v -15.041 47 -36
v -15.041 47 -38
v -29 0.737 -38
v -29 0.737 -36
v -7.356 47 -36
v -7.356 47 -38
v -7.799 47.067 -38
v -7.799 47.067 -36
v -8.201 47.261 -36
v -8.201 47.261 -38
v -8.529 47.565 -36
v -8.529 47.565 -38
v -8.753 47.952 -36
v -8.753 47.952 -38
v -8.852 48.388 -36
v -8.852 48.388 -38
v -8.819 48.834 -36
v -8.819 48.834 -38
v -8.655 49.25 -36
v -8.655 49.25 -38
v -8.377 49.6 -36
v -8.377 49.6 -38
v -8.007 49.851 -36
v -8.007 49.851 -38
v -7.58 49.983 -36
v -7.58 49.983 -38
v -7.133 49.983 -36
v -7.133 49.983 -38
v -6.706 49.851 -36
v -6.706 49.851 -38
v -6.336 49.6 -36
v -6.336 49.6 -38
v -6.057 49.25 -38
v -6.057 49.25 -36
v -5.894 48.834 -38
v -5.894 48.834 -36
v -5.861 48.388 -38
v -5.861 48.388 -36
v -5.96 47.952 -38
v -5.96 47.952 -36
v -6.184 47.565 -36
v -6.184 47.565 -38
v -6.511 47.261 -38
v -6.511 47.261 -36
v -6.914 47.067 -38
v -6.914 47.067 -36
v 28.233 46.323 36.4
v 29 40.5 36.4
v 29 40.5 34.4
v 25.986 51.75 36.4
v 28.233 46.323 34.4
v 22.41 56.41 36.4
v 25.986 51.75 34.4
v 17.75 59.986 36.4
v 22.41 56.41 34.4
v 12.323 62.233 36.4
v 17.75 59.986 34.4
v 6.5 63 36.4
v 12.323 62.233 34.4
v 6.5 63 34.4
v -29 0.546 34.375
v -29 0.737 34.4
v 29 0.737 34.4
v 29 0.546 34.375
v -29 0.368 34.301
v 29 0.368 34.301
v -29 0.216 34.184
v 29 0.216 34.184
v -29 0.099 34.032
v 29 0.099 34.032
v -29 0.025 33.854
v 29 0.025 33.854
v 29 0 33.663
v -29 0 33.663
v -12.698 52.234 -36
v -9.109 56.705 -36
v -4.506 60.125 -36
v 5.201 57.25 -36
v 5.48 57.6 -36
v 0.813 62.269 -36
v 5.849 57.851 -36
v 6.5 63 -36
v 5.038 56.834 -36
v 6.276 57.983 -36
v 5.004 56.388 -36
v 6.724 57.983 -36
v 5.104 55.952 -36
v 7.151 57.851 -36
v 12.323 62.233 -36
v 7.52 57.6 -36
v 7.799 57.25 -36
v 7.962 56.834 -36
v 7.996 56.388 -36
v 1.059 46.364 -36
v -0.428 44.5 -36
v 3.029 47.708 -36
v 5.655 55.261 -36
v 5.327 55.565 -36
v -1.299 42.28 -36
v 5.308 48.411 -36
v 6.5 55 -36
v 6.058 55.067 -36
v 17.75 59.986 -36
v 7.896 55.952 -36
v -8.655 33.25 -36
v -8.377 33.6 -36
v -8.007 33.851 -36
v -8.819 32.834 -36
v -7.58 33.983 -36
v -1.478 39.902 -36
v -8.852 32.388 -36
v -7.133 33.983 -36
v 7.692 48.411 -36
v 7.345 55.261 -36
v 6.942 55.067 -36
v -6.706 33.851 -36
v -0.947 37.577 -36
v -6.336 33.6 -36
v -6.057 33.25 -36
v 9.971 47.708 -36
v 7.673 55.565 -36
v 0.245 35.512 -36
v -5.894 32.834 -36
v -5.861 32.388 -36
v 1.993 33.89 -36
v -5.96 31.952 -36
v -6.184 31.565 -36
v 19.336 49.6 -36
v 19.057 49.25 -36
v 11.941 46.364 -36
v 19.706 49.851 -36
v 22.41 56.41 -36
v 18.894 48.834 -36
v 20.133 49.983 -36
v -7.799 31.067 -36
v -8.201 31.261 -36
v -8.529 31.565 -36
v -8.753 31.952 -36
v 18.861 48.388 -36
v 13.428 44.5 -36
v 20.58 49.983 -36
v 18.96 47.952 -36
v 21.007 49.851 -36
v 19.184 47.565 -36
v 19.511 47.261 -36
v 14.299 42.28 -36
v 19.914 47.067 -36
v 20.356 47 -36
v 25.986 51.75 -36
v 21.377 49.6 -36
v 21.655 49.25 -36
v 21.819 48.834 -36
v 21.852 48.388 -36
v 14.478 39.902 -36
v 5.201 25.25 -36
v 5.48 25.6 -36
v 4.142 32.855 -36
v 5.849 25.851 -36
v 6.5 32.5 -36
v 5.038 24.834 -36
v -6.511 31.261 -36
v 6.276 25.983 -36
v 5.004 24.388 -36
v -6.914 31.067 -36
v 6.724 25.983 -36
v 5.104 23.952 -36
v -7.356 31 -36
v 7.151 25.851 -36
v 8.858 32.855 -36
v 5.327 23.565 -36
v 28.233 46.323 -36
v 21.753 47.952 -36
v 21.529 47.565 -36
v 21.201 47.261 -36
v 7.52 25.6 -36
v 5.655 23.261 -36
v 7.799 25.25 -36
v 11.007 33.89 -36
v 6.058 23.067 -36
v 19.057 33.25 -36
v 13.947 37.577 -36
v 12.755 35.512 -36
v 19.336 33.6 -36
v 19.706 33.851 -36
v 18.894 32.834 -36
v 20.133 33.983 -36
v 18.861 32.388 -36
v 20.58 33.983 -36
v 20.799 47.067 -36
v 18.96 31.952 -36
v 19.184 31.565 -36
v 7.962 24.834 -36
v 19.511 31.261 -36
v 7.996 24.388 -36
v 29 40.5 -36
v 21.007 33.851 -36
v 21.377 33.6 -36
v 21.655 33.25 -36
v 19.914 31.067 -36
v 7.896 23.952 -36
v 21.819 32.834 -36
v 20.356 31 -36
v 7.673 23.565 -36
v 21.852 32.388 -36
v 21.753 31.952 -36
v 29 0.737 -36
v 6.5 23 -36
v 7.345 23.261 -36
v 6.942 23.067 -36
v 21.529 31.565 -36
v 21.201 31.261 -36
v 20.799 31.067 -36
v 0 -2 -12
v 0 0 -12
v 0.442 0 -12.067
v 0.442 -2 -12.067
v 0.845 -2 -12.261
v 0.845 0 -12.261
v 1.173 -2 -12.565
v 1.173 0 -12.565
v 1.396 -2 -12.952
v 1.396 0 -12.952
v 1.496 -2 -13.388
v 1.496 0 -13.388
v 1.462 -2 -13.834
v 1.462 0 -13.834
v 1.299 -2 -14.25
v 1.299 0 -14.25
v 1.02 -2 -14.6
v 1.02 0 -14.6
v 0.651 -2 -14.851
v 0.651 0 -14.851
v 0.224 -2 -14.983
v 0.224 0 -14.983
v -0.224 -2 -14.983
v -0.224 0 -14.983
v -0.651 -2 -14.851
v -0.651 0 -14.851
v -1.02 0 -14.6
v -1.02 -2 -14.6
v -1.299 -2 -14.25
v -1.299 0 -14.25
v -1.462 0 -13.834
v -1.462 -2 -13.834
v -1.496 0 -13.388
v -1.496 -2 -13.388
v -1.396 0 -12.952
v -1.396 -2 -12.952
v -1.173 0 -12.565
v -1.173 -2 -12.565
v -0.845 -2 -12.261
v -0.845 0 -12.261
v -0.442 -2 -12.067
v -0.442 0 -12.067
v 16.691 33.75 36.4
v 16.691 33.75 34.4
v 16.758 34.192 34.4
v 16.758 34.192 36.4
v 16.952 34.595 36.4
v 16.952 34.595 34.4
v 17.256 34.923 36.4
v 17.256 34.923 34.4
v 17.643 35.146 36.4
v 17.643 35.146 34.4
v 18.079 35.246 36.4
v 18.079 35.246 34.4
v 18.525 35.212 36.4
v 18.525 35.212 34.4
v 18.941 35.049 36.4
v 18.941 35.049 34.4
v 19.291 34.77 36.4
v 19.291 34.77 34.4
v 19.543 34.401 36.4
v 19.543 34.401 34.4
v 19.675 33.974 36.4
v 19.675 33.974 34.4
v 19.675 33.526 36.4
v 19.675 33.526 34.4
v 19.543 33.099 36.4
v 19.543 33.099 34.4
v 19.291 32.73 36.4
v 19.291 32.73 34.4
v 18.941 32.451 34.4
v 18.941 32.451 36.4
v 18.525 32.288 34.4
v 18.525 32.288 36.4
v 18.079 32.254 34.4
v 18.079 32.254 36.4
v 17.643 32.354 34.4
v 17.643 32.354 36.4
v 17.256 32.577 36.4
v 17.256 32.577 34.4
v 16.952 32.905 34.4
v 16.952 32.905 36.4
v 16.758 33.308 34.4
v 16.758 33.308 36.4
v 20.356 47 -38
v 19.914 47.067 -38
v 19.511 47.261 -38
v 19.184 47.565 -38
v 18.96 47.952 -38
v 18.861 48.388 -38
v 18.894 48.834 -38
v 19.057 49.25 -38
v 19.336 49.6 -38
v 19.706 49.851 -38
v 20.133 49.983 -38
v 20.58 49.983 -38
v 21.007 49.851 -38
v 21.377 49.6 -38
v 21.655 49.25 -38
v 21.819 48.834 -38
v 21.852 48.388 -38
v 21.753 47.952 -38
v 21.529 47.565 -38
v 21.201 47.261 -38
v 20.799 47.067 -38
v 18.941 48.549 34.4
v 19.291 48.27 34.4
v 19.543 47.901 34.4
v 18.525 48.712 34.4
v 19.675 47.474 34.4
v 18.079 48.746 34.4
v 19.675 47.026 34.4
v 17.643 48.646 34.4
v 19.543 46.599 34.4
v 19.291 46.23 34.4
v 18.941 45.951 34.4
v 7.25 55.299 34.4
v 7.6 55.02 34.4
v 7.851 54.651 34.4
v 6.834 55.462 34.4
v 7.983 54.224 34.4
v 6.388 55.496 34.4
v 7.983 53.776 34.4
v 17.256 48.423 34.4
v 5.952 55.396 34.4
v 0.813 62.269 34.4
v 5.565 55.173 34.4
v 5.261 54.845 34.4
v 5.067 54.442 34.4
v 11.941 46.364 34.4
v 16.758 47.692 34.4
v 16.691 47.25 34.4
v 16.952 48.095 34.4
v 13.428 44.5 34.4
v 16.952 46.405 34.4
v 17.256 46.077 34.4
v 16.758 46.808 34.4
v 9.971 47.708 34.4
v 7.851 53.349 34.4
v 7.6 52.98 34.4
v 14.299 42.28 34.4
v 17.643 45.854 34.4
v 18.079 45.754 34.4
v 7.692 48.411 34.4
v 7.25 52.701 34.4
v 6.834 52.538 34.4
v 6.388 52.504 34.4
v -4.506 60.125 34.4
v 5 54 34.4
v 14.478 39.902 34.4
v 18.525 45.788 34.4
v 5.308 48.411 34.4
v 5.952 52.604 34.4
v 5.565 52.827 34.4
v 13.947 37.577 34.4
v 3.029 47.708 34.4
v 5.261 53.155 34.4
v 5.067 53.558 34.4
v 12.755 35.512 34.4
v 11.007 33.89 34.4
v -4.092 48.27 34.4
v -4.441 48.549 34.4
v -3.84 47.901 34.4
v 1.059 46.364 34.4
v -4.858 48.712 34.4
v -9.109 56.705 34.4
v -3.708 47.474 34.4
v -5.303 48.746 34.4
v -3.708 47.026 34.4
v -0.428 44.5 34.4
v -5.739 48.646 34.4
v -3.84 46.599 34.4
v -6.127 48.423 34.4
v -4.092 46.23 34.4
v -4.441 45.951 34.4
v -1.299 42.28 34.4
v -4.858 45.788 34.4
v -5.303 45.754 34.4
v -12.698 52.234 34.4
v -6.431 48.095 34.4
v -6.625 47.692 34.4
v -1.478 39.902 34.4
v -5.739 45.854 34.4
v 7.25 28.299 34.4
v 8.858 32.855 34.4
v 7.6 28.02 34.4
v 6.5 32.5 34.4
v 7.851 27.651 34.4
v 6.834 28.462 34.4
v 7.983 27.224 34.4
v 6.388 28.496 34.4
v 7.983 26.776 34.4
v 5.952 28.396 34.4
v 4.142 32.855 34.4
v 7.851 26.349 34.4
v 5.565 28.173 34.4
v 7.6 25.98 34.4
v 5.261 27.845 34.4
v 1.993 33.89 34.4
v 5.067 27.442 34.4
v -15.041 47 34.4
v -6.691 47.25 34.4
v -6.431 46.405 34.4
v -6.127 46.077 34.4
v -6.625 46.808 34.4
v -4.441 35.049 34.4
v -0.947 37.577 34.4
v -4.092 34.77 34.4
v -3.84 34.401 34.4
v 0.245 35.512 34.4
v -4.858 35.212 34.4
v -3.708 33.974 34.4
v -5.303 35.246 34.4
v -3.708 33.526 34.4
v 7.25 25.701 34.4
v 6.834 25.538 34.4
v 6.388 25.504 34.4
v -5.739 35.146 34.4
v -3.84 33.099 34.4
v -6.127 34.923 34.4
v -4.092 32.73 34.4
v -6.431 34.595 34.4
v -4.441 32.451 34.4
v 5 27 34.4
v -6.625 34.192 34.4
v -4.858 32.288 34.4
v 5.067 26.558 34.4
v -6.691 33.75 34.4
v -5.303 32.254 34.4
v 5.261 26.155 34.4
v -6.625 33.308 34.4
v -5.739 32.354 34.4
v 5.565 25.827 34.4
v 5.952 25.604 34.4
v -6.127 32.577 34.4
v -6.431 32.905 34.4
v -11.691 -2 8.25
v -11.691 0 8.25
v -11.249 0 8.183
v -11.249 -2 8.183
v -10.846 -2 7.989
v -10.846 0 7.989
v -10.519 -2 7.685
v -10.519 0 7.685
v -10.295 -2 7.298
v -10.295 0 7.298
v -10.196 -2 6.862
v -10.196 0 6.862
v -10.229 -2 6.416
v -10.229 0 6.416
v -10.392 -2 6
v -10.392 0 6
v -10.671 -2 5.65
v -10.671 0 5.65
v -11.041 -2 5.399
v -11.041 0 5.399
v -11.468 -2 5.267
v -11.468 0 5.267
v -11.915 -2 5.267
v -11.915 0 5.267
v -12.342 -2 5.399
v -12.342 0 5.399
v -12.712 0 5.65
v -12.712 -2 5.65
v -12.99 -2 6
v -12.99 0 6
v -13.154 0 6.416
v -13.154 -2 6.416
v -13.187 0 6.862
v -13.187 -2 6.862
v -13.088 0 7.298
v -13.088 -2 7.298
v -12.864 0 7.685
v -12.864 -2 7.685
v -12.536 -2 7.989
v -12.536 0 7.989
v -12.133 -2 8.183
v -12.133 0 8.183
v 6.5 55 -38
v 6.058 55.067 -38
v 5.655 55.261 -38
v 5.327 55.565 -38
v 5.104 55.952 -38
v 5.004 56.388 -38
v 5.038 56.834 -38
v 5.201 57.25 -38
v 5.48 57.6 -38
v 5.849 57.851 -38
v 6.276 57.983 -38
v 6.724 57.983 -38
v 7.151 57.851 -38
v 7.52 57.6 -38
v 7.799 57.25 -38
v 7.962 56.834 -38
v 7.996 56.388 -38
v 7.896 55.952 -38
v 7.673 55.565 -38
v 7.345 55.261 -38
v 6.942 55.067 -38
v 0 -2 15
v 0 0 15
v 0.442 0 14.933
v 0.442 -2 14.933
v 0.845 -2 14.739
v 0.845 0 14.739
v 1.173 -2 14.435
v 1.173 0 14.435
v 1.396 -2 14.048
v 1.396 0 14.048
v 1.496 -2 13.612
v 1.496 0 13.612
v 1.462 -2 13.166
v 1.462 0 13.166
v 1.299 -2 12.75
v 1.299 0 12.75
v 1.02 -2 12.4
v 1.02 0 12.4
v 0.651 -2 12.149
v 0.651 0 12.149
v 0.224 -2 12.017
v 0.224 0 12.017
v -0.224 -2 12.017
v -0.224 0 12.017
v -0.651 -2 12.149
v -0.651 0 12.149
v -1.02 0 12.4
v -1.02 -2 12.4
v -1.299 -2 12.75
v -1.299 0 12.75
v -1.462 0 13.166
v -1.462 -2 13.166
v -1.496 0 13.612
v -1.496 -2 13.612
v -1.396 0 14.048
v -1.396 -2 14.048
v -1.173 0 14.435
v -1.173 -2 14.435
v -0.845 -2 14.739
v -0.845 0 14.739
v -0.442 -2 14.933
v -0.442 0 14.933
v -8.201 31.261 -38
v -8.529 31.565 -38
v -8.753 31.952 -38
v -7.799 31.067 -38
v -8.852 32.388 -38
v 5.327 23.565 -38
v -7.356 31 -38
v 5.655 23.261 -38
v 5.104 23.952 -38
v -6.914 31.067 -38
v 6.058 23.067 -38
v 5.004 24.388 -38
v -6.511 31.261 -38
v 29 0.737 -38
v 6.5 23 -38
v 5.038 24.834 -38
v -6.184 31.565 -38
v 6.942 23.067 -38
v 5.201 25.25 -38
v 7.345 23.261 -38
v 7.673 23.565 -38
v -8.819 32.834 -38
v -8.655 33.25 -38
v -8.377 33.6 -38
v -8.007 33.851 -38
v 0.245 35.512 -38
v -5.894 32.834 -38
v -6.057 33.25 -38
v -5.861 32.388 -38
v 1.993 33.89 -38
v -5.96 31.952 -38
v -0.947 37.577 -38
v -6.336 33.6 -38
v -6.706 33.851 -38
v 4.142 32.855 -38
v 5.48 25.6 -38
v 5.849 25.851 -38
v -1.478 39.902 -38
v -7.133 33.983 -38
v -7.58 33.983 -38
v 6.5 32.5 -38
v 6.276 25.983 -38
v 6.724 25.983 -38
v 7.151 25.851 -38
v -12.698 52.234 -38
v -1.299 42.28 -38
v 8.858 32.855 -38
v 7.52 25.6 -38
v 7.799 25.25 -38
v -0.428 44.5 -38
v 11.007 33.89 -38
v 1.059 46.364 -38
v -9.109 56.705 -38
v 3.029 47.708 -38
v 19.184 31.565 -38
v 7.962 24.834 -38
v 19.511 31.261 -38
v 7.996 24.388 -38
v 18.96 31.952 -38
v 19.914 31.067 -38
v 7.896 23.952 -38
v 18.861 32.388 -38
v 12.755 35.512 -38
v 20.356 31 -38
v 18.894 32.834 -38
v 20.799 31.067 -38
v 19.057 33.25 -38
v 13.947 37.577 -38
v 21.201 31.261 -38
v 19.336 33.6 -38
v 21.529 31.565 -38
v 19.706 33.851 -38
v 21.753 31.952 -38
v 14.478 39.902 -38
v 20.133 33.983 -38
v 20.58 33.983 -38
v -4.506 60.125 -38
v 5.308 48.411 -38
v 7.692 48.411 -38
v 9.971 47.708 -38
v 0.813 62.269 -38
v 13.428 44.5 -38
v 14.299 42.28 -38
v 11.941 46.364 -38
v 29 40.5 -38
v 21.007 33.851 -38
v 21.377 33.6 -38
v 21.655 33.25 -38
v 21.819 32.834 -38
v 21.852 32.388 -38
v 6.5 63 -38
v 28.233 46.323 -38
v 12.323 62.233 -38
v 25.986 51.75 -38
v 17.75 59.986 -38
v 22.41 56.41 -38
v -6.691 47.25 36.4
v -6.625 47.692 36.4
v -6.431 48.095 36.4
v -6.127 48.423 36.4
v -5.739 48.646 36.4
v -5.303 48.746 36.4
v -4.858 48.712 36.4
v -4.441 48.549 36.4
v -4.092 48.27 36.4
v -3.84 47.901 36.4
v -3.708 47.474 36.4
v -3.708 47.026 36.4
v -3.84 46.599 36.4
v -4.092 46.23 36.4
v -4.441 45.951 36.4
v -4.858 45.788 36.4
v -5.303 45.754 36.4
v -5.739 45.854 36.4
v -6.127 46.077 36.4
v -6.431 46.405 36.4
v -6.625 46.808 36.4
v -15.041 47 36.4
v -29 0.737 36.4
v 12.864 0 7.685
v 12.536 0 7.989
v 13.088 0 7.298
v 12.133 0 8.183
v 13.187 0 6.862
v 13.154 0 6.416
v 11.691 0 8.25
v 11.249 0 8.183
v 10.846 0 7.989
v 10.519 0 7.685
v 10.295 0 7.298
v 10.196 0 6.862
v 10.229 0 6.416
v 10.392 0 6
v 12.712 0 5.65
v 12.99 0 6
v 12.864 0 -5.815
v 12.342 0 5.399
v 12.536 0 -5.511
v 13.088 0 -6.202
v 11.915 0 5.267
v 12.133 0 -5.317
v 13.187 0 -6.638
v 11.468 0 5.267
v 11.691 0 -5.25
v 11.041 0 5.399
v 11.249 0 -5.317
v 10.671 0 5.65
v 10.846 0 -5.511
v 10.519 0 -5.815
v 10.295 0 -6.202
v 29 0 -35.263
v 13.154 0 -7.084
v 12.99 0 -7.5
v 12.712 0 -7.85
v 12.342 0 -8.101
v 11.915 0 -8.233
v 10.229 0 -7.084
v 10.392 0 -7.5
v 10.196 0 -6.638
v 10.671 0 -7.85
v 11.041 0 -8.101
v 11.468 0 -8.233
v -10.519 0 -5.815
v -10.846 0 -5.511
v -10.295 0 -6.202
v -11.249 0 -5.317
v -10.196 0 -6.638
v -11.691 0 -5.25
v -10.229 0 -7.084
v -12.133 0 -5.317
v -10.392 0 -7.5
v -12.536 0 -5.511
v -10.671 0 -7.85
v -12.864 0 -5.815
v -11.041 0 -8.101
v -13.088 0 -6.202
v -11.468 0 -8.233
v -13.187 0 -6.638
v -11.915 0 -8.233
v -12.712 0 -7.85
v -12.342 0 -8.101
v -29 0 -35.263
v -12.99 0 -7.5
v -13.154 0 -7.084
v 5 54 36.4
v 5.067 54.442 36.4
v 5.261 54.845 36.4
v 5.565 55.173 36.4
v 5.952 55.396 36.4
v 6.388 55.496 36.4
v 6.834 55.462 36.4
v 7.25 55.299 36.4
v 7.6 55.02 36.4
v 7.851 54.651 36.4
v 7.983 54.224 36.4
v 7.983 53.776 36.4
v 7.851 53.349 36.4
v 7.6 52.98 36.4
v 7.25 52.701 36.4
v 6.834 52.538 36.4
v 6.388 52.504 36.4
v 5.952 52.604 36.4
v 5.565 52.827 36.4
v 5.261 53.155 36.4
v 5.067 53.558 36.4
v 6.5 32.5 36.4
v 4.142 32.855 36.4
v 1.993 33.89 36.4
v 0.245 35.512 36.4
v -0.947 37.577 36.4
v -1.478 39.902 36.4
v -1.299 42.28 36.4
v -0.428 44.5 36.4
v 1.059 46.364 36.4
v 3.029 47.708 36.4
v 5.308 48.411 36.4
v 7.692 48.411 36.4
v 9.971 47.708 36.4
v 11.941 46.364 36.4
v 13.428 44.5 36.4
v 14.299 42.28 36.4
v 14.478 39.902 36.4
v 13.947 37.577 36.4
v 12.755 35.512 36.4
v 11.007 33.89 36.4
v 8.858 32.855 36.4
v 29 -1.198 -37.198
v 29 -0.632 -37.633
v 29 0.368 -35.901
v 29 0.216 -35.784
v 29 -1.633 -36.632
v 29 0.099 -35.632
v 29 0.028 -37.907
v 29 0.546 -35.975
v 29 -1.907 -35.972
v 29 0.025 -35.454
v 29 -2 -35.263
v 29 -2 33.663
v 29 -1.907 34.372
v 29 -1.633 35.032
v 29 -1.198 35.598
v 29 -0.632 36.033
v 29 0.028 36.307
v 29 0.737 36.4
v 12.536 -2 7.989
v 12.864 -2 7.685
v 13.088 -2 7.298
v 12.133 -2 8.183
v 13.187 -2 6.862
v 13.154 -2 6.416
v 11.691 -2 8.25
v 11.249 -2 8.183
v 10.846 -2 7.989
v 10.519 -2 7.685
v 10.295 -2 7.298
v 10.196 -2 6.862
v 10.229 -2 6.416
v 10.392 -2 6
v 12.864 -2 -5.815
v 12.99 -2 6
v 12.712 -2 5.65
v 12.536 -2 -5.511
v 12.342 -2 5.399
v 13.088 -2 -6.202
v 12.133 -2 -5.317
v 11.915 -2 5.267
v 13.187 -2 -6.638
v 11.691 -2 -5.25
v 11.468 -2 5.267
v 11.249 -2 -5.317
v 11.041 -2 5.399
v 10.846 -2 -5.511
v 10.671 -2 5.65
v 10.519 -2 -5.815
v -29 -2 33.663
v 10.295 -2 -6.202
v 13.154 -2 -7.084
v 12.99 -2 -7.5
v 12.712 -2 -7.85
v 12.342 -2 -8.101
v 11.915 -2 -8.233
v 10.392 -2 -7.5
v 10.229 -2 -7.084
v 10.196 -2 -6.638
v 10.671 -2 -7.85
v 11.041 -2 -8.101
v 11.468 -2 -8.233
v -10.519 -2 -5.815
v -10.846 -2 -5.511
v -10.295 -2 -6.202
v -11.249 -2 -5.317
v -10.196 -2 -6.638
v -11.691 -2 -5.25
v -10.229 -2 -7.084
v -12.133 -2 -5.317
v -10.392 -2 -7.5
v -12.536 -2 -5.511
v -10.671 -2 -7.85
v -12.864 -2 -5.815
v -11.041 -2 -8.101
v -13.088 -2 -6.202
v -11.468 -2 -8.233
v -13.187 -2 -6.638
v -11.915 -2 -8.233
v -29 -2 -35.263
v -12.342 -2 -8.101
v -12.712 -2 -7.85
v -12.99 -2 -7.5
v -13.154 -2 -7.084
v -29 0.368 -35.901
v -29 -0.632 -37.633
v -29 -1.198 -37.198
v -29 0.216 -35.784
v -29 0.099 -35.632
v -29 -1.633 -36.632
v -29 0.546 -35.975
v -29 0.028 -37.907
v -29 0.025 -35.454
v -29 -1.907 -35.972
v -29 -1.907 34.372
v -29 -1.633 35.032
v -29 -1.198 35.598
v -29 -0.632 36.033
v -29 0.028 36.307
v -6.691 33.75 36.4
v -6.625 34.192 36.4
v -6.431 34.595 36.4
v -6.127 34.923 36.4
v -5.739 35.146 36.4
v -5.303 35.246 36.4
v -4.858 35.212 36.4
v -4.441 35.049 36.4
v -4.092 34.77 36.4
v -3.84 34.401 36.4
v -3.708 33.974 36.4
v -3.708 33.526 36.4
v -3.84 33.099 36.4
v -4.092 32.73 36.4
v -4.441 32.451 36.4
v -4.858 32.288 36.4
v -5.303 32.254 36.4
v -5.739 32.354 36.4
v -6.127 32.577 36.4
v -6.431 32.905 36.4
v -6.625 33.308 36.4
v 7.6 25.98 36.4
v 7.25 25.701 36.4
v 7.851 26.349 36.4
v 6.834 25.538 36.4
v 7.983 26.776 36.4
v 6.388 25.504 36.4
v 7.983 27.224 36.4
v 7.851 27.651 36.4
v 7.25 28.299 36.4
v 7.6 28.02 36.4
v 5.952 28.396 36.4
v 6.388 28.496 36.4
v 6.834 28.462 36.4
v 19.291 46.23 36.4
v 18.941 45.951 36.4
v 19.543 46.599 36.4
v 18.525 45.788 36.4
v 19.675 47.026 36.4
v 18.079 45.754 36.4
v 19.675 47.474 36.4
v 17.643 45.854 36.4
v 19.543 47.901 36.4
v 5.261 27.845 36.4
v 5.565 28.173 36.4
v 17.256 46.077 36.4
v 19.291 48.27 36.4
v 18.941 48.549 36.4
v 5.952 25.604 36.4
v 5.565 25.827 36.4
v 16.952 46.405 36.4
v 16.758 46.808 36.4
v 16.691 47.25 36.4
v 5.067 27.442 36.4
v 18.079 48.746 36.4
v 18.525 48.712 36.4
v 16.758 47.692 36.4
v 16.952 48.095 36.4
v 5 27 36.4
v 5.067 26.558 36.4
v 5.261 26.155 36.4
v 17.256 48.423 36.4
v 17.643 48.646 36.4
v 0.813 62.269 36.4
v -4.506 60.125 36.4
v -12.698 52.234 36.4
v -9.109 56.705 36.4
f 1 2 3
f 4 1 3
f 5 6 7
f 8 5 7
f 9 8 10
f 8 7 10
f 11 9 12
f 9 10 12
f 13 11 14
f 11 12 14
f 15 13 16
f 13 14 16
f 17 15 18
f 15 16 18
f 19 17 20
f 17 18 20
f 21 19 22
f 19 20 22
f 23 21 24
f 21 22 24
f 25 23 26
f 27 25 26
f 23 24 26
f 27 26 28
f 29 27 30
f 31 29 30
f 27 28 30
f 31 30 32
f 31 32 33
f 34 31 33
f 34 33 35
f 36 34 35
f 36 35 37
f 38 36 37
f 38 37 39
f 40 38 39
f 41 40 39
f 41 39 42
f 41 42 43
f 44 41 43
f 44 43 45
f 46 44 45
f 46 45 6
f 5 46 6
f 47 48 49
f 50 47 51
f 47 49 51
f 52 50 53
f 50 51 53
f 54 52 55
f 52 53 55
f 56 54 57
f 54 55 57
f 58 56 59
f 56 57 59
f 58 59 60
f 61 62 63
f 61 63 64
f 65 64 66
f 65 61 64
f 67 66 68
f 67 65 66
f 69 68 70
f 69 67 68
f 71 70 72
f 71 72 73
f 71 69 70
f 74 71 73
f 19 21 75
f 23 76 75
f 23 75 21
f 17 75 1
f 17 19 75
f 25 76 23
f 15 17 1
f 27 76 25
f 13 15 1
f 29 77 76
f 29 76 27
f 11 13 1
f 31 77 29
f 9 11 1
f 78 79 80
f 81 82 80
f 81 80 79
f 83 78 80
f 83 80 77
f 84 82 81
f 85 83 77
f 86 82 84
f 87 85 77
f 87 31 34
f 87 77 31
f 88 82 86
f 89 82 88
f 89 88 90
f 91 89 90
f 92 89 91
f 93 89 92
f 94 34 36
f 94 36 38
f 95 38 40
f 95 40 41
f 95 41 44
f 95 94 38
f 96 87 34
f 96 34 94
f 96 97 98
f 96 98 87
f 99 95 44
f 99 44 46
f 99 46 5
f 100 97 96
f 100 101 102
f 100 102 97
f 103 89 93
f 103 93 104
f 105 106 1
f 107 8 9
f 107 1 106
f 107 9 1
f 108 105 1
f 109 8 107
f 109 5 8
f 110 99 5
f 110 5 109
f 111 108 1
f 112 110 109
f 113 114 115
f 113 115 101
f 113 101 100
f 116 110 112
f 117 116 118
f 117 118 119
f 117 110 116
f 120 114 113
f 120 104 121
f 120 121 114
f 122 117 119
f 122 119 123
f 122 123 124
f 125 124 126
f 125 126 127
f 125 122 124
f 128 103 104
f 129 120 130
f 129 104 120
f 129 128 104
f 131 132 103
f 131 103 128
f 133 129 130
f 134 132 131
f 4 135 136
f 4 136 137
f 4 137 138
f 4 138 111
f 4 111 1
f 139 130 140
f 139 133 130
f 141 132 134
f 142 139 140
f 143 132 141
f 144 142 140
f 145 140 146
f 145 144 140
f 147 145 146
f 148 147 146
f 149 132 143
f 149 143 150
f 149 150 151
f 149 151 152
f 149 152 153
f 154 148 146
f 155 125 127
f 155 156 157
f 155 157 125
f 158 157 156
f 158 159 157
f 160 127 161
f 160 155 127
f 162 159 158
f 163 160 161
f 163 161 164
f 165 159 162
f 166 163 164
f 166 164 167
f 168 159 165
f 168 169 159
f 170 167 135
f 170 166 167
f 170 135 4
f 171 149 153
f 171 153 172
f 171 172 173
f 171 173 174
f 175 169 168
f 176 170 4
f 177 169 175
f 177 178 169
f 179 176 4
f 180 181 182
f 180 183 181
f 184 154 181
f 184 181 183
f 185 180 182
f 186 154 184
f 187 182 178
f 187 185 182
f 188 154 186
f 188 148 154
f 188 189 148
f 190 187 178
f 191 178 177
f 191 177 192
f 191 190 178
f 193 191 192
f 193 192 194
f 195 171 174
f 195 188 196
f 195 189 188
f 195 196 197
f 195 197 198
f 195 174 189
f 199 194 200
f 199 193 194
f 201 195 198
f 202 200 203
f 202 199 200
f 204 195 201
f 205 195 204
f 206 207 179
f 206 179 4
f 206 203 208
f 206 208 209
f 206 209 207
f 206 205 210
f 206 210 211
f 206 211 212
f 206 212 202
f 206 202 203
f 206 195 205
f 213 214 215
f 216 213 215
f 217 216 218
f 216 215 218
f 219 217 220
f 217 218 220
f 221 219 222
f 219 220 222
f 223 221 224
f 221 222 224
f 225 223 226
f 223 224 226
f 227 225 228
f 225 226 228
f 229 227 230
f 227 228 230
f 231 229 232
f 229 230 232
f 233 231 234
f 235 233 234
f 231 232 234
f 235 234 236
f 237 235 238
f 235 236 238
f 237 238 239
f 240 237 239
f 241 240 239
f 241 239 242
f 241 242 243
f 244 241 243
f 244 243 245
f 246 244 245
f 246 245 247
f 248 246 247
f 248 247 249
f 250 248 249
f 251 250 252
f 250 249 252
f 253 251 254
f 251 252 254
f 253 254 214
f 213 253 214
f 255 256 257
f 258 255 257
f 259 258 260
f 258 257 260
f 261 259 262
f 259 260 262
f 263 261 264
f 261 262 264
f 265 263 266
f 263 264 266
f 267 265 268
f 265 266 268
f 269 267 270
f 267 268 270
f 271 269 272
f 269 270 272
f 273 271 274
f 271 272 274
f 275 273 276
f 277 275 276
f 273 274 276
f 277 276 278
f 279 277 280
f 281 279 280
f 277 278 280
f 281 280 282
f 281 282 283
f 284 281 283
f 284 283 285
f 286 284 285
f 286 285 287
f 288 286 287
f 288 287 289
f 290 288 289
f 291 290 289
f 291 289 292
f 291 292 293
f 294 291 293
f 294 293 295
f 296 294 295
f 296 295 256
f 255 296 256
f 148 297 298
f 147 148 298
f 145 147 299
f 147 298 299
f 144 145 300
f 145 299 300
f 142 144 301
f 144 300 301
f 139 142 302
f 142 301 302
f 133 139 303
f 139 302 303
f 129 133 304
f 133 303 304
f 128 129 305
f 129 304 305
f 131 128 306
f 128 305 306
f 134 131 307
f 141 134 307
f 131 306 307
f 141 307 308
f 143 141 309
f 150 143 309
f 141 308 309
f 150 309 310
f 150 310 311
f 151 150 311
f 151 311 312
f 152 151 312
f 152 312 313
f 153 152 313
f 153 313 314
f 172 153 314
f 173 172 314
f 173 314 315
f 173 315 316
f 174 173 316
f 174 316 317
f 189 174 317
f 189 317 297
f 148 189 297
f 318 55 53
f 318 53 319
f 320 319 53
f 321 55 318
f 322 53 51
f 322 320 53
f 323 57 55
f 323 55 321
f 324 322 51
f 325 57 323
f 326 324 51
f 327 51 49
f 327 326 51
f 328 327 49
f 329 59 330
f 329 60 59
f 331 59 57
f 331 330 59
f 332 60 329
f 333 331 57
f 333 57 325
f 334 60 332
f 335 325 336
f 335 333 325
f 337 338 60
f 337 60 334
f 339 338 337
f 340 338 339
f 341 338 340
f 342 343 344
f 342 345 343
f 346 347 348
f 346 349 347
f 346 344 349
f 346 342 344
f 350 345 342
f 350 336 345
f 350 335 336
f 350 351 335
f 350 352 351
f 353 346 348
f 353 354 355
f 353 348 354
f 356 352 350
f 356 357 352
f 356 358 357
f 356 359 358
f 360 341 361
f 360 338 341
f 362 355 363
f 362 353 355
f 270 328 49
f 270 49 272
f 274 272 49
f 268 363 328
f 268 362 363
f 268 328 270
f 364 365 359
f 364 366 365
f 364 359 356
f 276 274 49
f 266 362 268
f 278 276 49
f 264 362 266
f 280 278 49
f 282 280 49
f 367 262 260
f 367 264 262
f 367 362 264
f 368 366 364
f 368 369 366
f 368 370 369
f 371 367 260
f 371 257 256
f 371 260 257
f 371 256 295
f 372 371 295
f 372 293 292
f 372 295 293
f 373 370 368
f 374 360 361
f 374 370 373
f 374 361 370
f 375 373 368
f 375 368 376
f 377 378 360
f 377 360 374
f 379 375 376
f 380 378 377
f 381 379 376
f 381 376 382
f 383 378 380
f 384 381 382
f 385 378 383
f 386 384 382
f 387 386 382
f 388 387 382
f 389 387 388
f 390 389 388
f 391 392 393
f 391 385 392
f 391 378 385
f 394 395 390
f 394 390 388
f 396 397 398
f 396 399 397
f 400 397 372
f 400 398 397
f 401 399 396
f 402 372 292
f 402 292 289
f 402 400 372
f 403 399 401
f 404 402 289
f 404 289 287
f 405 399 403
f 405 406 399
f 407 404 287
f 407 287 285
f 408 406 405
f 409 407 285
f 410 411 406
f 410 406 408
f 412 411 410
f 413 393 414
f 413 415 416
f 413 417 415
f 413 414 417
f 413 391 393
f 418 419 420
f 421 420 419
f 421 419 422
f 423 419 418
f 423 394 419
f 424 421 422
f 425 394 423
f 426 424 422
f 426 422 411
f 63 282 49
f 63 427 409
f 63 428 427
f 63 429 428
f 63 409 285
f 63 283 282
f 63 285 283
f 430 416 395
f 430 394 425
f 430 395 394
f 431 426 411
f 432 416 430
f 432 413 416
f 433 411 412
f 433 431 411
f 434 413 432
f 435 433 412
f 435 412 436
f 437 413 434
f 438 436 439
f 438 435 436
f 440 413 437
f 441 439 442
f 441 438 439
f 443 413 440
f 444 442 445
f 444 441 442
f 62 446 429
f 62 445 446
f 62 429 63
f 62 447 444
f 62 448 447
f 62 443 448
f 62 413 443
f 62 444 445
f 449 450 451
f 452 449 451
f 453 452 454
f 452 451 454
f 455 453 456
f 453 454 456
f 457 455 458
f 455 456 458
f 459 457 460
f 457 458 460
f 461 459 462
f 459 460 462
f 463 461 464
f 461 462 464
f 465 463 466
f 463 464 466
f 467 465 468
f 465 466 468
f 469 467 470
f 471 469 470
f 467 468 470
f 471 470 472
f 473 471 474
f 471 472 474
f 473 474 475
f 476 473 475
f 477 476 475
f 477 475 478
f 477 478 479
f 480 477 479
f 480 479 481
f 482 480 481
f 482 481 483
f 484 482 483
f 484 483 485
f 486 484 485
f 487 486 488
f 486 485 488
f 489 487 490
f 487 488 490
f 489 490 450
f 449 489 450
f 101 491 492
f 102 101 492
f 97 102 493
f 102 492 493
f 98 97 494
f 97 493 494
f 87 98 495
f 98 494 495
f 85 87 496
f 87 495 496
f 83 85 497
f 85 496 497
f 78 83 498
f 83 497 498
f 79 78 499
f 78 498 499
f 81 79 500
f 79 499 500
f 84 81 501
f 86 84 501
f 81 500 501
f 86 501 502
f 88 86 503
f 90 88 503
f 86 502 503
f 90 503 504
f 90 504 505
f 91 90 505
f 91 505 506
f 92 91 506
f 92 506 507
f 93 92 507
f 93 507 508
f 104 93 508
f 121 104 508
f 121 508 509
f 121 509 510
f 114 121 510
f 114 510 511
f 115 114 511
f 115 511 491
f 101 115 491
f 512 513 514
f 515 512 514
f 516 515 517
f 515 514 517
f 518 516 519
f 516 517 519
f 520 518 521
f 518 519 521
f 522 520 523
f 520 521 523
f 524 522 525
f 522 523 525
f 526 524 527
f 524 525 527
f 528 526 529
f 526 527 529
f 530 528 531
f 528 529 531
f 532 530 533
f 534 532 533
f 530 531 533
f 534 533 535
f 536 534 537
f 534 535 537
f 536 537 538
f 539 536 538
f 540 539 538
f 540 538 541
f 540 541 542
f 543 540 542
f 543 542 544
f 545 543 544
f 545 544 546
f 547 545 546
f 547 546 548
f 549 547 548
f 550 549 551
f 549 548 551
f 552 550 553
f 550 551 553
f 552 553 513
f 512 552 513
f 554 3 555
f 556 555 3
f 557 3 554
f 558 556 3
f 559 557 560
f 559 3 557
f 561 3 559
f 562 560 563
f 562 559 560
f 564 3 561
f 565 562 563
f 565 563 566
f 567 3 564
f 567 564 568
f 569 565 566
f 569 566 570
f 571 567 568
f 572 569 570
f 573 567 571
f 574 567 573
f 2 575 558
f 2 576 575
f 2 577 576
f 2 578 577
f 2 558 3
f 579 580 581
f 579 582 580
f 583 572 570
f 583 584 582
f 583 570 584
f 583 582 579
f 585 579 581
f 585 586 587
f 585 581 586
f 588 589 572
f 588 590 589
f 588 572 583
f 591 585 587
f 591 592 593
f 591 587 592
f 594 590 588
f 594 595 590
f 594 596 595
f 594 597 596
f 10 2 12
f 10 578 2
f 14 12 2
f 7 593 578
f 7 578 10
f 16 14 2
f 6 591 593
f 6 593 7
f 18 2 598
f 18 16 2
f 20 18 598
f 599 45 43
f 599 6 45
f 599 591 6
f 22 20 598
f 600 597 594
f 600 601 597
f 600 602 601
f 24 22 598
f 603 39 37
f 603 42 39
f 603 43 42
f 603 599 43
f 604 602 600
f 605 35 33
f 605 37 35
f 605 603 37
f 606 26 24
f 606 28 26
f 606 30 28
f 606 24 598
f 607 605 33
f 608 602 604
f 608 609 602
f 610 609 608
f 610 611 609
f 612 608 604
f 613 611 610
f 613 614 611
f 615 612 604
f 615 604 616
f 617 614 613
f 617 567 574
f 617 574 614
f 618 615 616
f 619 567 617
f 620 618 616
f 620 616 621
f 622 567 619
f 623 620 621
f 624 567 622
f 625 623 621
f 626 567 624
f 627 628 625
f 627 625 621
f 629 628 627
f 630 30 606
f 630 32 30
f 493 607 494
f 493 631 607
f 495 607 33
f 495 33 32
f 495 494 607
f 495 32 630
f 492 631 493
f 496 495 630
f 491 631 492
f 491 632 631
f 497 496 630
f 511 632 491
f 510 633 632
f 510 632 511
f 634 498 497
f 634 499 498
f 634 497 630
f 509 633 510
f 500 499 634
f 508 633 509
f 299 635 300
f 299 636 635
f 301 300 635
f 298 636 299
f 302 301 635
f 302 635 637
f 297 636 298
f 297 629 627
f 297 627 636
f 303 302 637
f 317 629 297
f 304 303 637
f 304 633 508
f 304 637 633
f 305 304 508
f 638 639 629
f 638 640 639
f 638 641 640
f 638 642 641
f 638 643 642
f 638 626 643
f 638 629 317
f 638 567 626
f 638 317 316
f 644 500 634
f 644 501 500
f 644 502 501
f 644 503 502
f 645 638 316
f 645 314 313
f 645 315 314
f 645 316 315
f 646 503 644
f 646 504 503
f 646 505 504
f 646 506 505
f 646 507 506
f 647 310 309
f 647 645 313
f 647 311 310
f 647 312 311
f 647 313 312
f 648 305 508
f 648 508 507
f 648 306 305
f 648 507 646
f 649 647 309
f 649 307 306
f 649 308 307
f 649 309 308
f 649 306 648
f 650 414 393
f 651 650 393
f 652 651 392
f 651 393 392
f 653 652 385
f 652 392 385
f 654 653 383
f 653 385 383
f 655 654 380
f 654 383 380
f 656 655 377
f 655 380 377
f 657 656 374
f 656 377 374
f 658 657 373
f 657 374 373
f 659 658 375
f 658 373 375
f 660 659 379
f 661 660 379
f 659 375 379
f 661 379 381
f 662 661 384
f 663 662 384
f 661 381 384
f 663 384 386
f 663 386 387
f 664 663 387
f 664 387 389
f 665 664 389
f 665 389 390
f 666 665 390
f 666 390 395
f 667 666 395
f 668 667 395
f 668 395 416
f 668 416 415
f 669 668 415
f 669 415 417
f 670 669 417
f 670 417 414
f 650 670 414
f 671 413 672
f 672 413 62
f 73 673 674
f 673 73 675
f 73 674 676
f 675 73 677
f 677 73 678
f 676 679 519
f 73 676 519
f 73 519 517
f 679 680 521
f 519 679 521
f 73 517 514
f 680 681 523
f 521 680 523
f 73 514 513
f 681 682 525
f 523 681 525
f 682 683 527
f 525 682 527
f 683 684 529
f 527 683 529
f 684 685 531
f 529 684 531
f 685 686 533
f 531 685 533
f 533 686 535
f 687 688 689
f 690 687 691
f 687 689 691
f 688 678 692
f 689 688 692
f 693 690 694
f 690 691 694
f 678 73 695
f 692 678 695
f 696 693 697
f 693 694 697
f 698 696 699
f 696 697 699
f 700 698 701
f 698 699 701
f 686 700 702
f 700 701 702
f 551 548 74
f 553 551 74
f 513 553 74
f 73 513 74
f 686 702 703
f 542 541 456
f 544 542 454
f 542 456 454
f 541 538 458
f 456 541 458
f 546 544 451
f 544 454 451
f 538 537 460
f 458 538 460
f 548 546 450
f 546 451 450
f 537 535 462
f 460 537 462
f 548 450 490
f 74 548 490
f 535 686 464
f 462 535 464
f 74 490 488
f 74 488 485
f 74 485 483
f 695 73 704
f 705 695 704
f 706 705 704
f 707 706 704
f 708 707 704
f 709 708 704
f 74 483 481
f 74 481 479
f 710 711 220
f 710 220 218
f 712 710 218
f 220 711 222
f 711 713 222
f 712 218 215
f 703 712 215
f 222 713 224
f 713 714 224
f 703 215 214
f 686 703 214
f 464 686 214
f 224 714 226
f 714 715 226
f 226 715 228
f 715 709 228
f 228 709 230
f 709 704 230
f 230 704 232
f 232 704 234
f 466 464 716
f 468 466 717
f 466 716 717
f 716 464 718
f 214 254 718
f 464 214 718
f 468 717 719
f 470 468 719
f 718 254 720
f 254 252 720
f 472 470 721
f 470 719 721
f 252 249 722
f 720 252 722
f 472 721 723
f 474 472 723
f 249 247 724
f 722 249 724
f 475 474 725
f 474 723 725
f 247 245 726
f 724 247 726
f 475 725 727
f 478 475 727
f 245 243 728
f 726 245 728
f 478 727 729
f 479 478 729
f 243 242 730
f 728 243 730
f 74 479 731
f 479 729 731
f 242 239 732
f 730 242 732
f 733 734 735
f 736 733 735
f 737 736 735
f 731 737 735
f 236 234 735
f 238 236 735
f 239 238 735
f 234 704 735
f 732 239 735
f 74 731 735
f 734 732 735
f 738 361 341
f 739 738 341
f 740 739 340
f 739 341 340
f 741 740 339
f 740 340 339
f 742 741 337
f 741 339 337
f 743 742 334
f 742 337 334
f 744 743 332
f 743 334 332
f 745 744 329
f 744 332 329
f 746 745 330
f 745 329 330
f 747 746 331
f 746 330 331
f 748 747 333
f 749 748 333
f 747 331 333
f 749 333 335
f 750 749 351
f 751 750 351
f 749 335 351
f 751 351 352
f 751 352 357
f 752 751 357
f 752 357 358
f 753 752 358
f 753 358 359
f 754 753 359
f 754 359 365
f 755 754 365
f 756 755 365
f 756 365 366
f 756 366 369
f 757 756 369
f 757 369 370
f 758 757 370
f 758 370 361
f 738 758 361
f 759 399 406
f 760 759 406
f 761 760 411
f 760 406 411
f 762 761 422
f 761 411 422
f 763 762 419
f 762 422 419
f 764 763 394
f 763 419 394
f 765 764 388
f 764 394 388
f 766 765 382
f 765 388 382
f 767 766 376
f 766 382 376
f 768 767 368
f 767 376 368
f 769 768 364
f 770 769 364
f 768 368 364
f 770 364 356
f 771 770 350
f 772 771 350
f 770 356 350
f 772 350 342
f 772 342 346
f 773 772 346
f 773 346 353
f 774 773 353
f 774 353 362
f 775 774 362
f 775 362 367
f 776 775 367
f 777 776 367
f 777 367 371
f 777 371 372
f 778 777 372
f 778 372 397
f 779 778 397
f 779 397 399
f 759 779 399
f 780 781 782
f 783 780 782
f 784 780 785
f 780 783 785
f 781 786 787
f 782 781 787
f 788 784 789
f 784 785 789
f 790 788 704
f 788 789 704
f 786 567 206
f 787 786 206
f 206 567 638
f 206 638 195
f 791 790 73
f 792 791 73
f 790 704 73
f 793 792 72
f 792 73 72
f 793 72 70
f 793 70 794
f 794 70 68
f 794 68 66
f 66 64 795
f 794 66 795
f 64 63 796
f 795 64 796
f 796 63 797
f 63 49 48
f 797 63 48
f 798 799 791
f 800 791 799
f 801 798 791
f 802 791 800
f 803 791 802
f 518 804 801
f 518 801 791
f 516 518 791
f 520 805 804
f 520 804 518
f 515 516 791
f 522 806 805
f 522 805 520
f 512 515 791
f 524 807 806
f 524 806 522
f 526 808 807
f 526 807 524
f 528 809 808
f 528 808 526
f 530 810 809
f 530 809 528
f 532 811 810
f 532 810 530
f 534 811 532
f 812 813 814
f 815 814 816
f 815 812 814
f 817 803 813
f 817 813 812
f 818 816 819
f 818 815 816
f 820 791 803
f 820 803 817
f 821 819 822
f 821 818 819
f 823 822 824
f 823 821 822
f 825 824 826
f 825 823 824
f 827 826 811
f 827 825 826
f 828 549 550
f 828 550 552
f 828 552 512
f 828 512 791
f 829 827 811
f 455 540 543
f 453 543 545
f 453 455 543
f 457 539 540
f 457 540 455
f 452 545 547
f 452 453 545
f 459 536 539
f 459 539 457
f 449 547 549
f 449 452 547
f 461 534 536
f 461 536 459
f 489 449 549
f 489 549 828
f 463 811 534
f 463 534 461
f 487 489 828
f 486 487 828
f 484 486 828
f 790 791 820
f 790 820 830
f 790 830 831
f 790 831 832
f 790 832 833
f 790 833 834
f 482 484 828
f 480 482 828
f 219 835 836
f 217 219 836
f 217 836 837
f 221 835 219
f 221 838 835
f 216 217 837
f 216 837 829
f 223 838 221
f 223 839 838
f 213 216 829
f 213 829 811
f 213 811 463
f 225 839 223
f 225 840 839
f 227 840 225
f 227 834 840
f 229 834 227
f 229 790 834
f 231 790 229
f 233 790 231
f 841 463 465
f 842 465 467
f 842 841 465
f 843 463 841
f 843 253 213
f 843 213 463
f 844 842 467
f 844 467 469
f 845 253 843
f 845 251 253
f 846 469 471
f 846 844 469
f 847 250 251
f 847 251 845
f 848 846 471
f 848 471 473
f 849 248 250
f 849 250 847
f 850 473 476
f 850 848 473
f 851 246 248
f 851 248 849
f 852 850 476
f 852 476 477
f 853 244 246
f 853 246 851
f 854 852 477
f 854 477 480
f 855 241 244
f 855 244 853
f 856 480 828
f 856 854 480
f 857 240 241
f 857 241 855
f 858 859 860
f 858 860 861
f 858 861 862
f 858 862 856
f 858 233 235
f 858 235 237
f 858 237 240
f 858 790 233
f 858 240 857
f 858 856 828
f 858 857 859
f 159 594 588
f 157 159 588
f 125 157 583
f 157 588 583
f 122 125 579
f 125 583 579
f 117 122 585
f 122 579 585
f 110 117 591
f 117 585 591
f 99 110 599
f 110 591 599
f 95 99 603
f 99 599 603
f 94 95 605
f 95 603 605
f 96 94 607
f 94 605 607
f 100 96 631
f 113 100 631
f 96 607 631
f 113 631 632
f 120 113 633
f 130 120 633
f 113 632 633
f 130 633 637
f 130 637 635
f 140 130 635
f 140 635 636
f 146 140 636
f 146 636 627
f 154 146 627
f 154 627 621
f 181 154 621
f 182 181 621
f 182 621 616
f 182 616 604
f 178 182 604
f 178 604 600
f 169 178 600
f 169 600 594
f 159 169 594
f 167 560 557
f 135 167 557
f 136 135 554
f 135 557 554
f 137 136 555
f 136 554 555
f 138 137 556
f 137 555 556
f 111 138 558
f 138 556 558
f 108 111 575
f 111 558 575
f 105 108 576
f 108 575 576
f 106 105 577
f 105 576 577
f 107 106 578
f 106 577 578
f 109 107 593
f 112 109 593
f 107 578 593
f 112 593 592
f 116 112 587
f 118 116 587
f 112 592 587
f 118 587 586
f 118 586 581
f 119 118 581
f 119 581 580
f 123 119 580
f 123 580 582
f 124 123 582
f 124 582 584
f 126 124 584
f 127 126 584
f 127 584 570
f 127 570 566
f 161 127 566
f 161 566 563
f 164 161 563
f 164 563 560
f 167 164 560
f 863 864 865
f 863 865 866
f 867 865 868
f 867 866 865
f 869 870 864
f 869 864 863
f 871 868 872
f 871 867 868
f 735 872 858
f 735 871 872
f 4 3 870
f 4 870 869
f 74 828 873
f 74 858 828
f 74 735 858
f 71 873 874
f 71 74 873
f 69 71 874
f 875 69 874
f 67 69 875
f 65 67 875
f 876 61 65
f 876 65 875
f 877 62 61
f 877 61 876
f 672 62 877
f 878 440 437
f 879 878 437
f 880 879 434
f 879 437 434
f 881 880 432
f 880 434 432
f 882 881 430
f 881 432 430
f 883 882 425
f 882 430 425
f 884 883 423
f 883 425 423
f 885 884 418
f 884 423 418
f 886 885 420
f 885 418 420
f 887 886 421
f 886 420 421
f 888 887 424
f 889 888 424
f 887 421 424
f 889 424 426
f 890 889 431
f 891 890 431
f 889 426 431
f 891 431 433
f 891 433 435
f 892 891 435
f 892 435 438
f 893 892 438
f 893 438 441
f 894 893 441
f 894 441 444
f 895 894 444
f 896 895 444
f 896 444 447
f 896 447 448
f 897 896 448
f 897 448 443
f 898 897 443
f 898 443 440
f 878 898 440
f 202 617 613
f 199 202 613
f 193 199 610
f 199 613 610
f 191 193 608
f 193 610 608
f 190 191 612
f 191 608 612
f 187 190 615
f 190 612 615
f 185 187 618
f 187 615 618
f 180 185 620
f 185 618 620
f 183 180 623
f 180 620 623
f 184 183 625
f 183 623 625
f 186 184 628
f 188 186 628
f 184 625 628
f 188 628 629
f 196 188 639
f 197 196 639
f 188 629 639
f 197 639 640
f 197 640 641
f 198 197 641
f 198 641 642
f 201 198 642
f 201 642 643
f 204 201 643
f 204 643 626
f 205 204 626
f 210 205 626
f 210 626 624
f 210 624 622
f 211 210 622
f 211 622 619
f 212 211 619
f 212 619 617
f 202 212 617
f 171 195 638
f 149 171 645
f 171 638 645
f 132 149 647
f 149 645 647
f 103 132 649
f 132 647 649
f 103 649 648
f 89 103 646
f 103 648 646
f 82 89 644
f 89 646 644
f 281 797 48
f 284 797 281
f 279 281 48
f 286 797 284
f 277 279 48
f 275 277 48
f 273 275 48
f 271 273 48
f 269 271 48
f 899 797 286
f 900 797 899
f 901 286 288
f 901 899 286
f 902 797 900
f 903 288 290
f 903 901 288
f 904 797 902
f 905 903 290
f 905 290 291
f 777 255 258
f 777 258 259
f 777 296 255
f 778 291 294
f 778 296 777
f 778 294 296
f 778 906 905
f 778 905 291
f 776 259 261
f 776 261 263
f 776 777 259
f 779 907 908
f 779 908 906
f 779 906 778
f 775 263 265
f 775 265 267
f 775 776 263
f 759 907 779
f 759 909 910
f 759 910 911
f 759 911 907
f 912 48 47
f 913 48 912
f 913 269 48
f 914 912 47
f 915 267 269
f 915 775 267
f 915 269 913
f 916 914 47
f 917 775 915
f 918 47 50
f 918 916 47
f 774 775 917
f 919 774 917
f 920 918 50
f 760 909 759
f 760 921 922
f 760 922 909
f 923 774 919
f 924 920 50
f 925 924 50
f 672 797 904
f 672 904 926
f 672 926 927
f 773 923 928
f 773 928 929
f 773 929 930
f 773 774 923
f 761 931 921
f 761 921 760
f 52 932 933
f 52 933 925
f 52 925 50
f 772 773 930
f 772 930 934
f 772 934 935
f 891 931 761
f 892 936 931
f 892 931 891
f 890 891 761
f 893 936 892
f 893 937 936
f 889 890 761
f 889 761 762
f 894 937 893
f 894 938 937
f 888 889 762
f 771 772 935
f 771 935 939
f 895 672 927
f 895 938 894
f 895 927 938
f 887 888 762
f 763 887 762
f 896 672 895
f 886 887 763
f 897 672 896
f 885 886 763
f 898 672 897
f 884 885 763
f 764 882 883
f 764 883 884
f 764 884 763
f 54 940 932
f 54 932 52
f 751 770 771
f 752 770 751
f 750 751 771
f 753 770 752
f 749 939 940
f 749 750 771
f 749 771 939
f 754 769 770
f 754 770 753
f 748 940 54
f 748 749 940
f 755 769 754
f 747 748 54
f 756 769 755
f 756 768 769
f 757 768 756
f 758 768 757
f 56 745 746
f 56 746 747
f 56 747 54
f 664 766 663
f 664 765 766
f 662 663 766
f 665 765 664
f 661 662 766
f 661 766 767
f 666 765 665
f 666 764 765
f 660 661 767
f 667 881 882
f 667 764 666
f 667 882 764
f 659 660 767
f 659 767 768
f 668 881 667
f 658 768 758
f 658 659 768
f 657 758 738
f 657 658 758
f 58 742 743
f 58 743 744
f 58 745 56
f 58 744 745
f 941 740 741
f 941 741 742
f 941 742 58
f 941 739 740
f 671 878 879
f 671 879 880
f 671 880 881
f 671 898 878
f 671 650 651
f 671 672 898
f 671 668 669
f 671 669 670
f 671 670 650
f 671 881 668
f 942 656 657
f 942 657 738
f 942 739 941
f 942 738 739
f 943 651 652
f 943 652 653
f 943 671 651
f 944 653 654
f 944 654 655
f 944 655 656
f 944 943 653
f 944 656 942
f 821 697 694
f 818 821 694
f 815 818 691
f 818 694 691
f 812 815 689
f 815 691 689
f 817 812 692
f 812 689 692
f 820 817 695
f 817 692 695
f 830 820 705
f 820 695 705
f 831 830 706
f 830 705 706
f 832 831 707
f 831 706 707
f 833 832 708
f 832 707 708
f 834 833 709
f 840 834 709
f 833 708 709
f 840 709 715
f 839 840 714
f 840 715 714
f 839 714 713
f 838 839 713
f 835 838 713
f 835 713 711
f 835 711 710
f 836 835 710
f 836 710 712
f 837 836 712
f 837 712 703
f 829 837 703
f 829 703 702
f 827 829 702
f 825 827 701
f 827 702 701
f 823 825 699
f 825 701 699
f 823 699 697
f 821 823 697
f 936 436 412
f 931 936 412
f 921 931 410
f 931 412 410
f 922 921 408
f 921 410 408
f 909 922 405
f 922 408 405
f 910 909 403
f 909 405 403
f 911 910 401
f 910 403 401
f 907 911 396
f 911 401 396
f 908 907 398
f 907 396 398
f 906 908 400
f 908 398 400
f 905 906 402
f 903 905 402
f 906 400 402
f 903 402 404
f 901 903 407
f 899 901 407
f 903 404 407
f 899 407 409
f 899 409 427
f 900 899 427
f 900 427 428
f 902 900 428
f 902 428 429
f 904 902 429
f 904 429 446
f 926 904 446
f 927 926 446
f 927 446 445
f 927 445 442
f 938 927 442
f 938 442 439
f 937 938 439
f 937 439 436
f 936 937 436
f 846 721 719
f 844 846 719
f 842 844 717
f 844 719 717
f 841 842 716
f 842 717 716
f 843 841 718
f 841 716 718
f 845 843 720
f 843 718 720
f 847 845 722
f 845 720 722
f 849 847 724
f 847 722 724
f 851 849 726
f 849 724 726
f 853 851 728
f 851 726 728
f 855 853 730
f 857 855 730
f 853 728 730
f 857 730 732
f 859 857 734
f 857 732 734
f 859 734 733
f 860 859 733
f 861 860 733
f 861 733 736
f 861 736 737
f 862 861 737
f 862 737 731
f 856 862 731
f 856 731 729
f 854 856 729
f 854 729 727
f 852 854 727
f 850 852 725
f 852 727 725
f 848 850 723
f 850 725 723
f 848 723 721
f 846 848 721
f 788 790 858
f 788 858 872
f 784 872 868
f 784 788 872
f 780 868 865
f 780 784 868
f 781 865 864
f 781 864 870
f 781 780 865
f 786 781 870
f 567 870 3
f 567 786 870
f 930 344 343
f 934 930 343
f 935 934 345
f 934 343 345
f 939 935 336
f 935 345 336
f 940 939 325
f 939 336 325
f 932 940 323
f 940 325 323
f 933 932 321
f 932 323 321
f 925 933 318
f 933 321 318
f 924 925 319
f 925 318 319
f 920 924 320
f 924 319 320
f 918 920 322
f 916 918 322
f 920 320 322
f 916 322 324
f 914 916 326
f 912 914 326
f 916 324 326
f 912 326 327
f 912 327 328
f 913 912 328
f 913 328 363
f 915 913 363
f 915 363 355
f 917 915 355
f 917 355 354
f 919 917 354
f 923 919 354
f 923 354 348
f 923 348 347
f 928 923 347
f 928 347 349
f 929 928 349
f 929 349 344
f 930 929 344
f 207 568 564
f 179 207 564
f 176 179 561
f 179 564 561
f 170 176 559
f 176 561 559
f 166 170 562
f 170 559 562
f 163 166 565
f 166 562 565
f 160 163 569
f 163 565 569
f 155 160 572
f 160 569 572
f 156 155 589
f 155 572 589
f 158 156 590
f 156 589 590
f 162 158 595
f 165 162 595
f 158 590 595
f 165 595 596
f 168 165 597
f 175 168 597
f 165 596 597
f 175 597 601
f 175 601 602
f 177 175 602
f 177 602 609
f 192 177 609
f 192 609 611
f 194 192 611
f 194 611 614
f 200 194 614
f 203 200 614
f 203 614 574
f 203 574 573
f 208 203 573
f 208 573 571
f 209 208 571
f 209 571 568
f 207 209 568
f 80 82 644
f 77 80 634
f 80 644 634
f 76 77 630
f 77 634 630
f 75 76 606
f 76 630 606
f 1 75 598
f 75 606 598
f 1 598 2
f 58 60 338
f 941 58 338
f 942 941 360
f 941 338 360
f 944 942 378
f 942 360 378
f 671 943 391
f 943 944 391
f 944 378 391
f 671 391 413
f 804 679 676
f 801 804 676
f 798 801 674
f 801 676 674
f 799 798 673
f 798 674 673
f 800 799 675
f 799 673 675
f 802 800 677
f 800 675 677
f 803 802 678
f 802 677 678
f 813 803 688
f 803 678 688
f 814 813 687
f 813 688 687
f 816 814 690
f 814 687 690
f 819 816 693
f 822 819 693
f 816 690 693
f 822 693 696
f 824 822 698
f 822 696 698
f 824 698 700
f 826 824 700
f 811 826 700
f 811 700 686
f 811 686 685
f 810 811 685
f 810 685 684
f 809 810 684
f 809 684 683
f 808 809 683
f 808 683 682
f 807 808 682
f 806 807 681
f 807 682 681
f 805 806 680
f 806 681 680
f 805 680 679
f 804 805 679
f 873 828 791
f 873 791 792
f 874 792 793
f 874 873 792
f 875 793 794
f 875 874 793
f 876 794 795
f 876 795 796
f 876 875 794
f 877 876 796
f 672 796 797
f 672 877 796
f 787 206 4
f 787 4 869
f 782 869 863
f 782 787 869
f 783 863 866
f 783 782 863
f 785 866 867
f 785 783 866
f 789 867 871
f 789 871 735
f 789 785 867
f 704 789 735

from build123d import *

# Parameters (mm, degrees)
SKETCH_1_R                         = 1.5
SM_BASE_FLANGE_1_DEPTH             = 2
SM_EDGE_FLANGE_1_STRIP_W           = 9.4732
SM_EDGE_FLANGE_1_STRIP_H           = 2
SM_EDGE_FLANGE_1_STRIP_CUT_DEPTH   = 58
SM_EDGE_FLANGE_1_STRIP_2_W         = 9.4732
SM_EDGE_FLANGE_1_STRIP_2_H         = 2
SM_EDGE_FLANGE_1_STRIP_CUT_2_DEPTH = 58
SM_EDGE_FLANGE_1_DEPTH             = 58
SM_EDGE_FLANGE_1_BEND_DEPTH        = 58
SKETCH_12_R                        = 1.5
SKETCH_12_R_2                      = 8
CUT_EXTRUDE_1_DEPTH                = 10
SKETCH_21_R                        = 1.5
SKETCH_21_R_2                      = 8
CUT_EXTRUDE_2_DEPTH                = 10
CUT_EXTRUDE_3_DEPTH                = 102.712142835


# Sheet-metal steps are written as plain solids
with BuildPart() as part:
    # Sketch 1 → 基体-法兰1 (new body)
    with BuildSketch(Plane(origin=(0, 0, 0), x_dir=(1, 0, 0), z_dir=(0, 1, 0))):
        Polygon((-29, -36), (-29, 36), (-29, 38), (29, 38), (29, 36), (29, -36), (29, -36.4), (-29, -36.4), align=None)
        with Locations(Location((0, 13.5, 0), (0, 0, 270))):
            Circle(SKETCH_1_R, mode=Mode.SUBTRACT)
        with Locations(Location((11.691342951, 6.75, 0), (0, 0, 270))):
            Circle(SKETCH_1_R, mode=Mode.SUBTRACT)
        with Locations(Location((11.691342951, -6.75, 0), (0, 0, 270))):
            Circle(SKETCH_1_R, mode=Mode.SUBTRACT)
        with Locations(Location((0, -13.5, 0), (0, 0, 270))):
            Circle(SKETCH_1_R, mode=Mode.SUBTRACT)
        with Locations(Location((-11.691342951, -6.75, 0), (0, 0, 270))):
            Circle(SKETCH_1_R, mode=Mode.SUBTRACT)
        with Locations(Location((-11.691342951, 6.75, 0), (0, 0, 270))):
            Circle(SKETCH_1_R, mode=Mode.SUBTRACT)
    extrude(amount=-SM_BASE_FLANGE_1_DEPTH)

    # 边线-法兰1 strip (across the edge) → 边线-法兰1 strip cut (cut)
    with BuildSketch(Plane(origin=(29, 0, -38), x_dir=(0, 0, 1), z_dir=(-1, 0, 0))):
        with Locations((-2, -1)):
            Rectangle(SM_EDGE_FLANGE_1_STRIP_W, SM_EDGE_FLANGE_1_STRIP_H)
    extrude(amount=SM_EDGE_FLANGE_1_STRIP_CUT_DEPTH, mode=Mode.SUBTRACT)

    # 边线-法兰1 strip 2 (across the edge) → 边线-法兰1 strip cut 2 (cut)
    with BuildSketch(Plane(origin=(-29, 0, 36.4), x_dir=(0, 0, -1), z_dir=(1, 0, 0))):
        with Locations((-2, -1)):
            Rectangle(SM_EDGE_FLANGE_1_STRIP_2_W, SM_EDGE_FLANGE_1_STRIP_2_H)
    extrude(amount=SM_EDGE_FLANGE_1_STRIP_CUT_2_DEPTH, mode=Mode.SUBTRACT)

    # 边线-法兰1 section (across the edge) → 边线-法兰1 (add)
    with BuildSketch(Plane(origin=(29, 0, -38), x_dir=(0, 0, 1), z_dir=(-1, 0, 0))):
        with BuildLine():
            Line((0, 0.7366), (0, 63))
            Line((0, 63), (2, 63))
            Line((2, 63), (2, 0.7366))
            ThreePointArc((2, 0.7366), (2.215745145, 0.215745145), (2.7366, 0))
            Line((2.7366, 0), (2.7366, -2))
            ThreePointArc((2.7366, -2), (0.801531583, -1.198468417), (0, 0.7366))
        make_face()
    extrude(amount=SM_EDGE_FLANGE_1_DEPTH)

    # 边线-法兰1 section 2 (across the edge) → 边线-法兰1 bend (add)
    with BuildSketch(Plane(origin=(-29, 0, 36.4), x_dir=(0, 0, -1), z_dir=(1, 0, 0))):
        with BuildLine():
            Line((0, 0.7366), (0, 63))
            Line((0, 63), (2, 63))
            Line((2, 63), (2, 0.7366))
            ThreePointArc((2, 0.7366), (2.215745145, 0.215745145), (2.7366, 0))
            Line((2.7366, 0), (2.7366, -2))
            ThreePointArc((2.7366, -2), (0.801531583, -1.198468417), (0, 0.7366))
        make_face()
    extrude(amount=SM_EDGE_FLANGE_1_BEND_DEPTH)

    # 草图12 → 切除-拉伸1 (cut)
    with BuildSketch(Plane(origin=(0, 0, -38), x_dir=(-1, 0, 0), z_dir=(0, 0, -1))):
        with BuildLine():
            ThreePointArc((-29, 40.5), (-22.409902591, 56.409902563), (-6.50000004, 63))
            Line((-6.50000004, 63), (-29, 63))
            Line((-29, 63), (-29, 40.5))
        make_face()
        with Locations(Location((-6.5, 56.5, 0), (0, 0, 270))):
            Circle(SKETCH_12_R)
        with Locations(Location((7.356406461, 48.5, 0), (0, 0, 270))):
            Circle(SKETCH_12_R)
        with Locations(Location((-20.356406461, 48.5, 0), (0, 0, 270))):
            Circle(SKETCH_12_R)
        with Locations(Location((-20.356406461, 32.5, 0), (0, 0, 270))):
            Circle(SKETCH_12_R)
        with Locations(Location((-6.5, 24.5, 0), (0, 0, 270))):
            Circle(SKETCH_12_R)
        with Locations(Location((7.356406461, 32.5, 0), (0, 0, 270))):
            Circle(SKETCH_12_R)
        with Locations(Location((-6.5, 40.5, 0), (0, 0, 270))):
            Circle(SKETCH_12_R_2)
    extrude(amount=-CUT_EXTRUDE_1_DEPTH, mode=Mode.SUBTRACT)

    # 草图21 → 切除-拉伸2 (cut)
    with BuildSketch(Plane(origin=(0, 0, 34.4), x_dir=(-1, 0, 0), z_dir=(0, 0, -1))):
        with Locations((5.191342951, 47.25)):
            Circle(SKETCH_21_R)
        with Locations(Location((-6.5, 40.5, 0), (0, 0, 270))):
            Circle(SKETCH_21_R_2)
        with Locations((-6.5, 54)):
            Circle(SKETCH_21_R)
        with BuildLine():
            ThreePointArc((-29, 40.5), (-22.409902577, 56.409902577), (-6.5, 63))
            Line((-6.5, 63), (-29, 63))
            Line((-29, 63), (-29, 40.5))
        make_face()
        with Locations((-18.191342951, 47.25)):
            Circle(SKETCH_21_R)
        with Locations((-18.191342951, 33.75)):
            Circle(SKETCH_21_R)
        with Locations((-6.5, 27)):
            Circle(SKETCH_21_R)
        with Locations((5.191342951, 33.75)):
            Circle(SKETCH_21_R)
    extrude(amount=-CUT_EXTRUDE_2_DEPTH, mode=Mode.SUBTRACT)

    # 草图22 → 切除-拉伸3 (cut, through all)
    with BuildSketch(Plane(origin=(0, 0, -38), x_dir=(-1, 0, 0), z_dir=(0, 0, -1))):
        with BuildLine():
            Line((15.040771003, 46.999629574), (29, 0.7366))
            Line((29, 0.7366), (29, 63))
            Line((29, 63), (-6.5, 63))
            ThreePointArc((-6.5, 63), (6.91656317, 58.56227651), (15.040771003, 46.999629574))
        make_face()
    extrude(amount=-CUT_EXTRUDE_3_DEPTH, mode=Mode.SUBTRACT)


solid = part.part
